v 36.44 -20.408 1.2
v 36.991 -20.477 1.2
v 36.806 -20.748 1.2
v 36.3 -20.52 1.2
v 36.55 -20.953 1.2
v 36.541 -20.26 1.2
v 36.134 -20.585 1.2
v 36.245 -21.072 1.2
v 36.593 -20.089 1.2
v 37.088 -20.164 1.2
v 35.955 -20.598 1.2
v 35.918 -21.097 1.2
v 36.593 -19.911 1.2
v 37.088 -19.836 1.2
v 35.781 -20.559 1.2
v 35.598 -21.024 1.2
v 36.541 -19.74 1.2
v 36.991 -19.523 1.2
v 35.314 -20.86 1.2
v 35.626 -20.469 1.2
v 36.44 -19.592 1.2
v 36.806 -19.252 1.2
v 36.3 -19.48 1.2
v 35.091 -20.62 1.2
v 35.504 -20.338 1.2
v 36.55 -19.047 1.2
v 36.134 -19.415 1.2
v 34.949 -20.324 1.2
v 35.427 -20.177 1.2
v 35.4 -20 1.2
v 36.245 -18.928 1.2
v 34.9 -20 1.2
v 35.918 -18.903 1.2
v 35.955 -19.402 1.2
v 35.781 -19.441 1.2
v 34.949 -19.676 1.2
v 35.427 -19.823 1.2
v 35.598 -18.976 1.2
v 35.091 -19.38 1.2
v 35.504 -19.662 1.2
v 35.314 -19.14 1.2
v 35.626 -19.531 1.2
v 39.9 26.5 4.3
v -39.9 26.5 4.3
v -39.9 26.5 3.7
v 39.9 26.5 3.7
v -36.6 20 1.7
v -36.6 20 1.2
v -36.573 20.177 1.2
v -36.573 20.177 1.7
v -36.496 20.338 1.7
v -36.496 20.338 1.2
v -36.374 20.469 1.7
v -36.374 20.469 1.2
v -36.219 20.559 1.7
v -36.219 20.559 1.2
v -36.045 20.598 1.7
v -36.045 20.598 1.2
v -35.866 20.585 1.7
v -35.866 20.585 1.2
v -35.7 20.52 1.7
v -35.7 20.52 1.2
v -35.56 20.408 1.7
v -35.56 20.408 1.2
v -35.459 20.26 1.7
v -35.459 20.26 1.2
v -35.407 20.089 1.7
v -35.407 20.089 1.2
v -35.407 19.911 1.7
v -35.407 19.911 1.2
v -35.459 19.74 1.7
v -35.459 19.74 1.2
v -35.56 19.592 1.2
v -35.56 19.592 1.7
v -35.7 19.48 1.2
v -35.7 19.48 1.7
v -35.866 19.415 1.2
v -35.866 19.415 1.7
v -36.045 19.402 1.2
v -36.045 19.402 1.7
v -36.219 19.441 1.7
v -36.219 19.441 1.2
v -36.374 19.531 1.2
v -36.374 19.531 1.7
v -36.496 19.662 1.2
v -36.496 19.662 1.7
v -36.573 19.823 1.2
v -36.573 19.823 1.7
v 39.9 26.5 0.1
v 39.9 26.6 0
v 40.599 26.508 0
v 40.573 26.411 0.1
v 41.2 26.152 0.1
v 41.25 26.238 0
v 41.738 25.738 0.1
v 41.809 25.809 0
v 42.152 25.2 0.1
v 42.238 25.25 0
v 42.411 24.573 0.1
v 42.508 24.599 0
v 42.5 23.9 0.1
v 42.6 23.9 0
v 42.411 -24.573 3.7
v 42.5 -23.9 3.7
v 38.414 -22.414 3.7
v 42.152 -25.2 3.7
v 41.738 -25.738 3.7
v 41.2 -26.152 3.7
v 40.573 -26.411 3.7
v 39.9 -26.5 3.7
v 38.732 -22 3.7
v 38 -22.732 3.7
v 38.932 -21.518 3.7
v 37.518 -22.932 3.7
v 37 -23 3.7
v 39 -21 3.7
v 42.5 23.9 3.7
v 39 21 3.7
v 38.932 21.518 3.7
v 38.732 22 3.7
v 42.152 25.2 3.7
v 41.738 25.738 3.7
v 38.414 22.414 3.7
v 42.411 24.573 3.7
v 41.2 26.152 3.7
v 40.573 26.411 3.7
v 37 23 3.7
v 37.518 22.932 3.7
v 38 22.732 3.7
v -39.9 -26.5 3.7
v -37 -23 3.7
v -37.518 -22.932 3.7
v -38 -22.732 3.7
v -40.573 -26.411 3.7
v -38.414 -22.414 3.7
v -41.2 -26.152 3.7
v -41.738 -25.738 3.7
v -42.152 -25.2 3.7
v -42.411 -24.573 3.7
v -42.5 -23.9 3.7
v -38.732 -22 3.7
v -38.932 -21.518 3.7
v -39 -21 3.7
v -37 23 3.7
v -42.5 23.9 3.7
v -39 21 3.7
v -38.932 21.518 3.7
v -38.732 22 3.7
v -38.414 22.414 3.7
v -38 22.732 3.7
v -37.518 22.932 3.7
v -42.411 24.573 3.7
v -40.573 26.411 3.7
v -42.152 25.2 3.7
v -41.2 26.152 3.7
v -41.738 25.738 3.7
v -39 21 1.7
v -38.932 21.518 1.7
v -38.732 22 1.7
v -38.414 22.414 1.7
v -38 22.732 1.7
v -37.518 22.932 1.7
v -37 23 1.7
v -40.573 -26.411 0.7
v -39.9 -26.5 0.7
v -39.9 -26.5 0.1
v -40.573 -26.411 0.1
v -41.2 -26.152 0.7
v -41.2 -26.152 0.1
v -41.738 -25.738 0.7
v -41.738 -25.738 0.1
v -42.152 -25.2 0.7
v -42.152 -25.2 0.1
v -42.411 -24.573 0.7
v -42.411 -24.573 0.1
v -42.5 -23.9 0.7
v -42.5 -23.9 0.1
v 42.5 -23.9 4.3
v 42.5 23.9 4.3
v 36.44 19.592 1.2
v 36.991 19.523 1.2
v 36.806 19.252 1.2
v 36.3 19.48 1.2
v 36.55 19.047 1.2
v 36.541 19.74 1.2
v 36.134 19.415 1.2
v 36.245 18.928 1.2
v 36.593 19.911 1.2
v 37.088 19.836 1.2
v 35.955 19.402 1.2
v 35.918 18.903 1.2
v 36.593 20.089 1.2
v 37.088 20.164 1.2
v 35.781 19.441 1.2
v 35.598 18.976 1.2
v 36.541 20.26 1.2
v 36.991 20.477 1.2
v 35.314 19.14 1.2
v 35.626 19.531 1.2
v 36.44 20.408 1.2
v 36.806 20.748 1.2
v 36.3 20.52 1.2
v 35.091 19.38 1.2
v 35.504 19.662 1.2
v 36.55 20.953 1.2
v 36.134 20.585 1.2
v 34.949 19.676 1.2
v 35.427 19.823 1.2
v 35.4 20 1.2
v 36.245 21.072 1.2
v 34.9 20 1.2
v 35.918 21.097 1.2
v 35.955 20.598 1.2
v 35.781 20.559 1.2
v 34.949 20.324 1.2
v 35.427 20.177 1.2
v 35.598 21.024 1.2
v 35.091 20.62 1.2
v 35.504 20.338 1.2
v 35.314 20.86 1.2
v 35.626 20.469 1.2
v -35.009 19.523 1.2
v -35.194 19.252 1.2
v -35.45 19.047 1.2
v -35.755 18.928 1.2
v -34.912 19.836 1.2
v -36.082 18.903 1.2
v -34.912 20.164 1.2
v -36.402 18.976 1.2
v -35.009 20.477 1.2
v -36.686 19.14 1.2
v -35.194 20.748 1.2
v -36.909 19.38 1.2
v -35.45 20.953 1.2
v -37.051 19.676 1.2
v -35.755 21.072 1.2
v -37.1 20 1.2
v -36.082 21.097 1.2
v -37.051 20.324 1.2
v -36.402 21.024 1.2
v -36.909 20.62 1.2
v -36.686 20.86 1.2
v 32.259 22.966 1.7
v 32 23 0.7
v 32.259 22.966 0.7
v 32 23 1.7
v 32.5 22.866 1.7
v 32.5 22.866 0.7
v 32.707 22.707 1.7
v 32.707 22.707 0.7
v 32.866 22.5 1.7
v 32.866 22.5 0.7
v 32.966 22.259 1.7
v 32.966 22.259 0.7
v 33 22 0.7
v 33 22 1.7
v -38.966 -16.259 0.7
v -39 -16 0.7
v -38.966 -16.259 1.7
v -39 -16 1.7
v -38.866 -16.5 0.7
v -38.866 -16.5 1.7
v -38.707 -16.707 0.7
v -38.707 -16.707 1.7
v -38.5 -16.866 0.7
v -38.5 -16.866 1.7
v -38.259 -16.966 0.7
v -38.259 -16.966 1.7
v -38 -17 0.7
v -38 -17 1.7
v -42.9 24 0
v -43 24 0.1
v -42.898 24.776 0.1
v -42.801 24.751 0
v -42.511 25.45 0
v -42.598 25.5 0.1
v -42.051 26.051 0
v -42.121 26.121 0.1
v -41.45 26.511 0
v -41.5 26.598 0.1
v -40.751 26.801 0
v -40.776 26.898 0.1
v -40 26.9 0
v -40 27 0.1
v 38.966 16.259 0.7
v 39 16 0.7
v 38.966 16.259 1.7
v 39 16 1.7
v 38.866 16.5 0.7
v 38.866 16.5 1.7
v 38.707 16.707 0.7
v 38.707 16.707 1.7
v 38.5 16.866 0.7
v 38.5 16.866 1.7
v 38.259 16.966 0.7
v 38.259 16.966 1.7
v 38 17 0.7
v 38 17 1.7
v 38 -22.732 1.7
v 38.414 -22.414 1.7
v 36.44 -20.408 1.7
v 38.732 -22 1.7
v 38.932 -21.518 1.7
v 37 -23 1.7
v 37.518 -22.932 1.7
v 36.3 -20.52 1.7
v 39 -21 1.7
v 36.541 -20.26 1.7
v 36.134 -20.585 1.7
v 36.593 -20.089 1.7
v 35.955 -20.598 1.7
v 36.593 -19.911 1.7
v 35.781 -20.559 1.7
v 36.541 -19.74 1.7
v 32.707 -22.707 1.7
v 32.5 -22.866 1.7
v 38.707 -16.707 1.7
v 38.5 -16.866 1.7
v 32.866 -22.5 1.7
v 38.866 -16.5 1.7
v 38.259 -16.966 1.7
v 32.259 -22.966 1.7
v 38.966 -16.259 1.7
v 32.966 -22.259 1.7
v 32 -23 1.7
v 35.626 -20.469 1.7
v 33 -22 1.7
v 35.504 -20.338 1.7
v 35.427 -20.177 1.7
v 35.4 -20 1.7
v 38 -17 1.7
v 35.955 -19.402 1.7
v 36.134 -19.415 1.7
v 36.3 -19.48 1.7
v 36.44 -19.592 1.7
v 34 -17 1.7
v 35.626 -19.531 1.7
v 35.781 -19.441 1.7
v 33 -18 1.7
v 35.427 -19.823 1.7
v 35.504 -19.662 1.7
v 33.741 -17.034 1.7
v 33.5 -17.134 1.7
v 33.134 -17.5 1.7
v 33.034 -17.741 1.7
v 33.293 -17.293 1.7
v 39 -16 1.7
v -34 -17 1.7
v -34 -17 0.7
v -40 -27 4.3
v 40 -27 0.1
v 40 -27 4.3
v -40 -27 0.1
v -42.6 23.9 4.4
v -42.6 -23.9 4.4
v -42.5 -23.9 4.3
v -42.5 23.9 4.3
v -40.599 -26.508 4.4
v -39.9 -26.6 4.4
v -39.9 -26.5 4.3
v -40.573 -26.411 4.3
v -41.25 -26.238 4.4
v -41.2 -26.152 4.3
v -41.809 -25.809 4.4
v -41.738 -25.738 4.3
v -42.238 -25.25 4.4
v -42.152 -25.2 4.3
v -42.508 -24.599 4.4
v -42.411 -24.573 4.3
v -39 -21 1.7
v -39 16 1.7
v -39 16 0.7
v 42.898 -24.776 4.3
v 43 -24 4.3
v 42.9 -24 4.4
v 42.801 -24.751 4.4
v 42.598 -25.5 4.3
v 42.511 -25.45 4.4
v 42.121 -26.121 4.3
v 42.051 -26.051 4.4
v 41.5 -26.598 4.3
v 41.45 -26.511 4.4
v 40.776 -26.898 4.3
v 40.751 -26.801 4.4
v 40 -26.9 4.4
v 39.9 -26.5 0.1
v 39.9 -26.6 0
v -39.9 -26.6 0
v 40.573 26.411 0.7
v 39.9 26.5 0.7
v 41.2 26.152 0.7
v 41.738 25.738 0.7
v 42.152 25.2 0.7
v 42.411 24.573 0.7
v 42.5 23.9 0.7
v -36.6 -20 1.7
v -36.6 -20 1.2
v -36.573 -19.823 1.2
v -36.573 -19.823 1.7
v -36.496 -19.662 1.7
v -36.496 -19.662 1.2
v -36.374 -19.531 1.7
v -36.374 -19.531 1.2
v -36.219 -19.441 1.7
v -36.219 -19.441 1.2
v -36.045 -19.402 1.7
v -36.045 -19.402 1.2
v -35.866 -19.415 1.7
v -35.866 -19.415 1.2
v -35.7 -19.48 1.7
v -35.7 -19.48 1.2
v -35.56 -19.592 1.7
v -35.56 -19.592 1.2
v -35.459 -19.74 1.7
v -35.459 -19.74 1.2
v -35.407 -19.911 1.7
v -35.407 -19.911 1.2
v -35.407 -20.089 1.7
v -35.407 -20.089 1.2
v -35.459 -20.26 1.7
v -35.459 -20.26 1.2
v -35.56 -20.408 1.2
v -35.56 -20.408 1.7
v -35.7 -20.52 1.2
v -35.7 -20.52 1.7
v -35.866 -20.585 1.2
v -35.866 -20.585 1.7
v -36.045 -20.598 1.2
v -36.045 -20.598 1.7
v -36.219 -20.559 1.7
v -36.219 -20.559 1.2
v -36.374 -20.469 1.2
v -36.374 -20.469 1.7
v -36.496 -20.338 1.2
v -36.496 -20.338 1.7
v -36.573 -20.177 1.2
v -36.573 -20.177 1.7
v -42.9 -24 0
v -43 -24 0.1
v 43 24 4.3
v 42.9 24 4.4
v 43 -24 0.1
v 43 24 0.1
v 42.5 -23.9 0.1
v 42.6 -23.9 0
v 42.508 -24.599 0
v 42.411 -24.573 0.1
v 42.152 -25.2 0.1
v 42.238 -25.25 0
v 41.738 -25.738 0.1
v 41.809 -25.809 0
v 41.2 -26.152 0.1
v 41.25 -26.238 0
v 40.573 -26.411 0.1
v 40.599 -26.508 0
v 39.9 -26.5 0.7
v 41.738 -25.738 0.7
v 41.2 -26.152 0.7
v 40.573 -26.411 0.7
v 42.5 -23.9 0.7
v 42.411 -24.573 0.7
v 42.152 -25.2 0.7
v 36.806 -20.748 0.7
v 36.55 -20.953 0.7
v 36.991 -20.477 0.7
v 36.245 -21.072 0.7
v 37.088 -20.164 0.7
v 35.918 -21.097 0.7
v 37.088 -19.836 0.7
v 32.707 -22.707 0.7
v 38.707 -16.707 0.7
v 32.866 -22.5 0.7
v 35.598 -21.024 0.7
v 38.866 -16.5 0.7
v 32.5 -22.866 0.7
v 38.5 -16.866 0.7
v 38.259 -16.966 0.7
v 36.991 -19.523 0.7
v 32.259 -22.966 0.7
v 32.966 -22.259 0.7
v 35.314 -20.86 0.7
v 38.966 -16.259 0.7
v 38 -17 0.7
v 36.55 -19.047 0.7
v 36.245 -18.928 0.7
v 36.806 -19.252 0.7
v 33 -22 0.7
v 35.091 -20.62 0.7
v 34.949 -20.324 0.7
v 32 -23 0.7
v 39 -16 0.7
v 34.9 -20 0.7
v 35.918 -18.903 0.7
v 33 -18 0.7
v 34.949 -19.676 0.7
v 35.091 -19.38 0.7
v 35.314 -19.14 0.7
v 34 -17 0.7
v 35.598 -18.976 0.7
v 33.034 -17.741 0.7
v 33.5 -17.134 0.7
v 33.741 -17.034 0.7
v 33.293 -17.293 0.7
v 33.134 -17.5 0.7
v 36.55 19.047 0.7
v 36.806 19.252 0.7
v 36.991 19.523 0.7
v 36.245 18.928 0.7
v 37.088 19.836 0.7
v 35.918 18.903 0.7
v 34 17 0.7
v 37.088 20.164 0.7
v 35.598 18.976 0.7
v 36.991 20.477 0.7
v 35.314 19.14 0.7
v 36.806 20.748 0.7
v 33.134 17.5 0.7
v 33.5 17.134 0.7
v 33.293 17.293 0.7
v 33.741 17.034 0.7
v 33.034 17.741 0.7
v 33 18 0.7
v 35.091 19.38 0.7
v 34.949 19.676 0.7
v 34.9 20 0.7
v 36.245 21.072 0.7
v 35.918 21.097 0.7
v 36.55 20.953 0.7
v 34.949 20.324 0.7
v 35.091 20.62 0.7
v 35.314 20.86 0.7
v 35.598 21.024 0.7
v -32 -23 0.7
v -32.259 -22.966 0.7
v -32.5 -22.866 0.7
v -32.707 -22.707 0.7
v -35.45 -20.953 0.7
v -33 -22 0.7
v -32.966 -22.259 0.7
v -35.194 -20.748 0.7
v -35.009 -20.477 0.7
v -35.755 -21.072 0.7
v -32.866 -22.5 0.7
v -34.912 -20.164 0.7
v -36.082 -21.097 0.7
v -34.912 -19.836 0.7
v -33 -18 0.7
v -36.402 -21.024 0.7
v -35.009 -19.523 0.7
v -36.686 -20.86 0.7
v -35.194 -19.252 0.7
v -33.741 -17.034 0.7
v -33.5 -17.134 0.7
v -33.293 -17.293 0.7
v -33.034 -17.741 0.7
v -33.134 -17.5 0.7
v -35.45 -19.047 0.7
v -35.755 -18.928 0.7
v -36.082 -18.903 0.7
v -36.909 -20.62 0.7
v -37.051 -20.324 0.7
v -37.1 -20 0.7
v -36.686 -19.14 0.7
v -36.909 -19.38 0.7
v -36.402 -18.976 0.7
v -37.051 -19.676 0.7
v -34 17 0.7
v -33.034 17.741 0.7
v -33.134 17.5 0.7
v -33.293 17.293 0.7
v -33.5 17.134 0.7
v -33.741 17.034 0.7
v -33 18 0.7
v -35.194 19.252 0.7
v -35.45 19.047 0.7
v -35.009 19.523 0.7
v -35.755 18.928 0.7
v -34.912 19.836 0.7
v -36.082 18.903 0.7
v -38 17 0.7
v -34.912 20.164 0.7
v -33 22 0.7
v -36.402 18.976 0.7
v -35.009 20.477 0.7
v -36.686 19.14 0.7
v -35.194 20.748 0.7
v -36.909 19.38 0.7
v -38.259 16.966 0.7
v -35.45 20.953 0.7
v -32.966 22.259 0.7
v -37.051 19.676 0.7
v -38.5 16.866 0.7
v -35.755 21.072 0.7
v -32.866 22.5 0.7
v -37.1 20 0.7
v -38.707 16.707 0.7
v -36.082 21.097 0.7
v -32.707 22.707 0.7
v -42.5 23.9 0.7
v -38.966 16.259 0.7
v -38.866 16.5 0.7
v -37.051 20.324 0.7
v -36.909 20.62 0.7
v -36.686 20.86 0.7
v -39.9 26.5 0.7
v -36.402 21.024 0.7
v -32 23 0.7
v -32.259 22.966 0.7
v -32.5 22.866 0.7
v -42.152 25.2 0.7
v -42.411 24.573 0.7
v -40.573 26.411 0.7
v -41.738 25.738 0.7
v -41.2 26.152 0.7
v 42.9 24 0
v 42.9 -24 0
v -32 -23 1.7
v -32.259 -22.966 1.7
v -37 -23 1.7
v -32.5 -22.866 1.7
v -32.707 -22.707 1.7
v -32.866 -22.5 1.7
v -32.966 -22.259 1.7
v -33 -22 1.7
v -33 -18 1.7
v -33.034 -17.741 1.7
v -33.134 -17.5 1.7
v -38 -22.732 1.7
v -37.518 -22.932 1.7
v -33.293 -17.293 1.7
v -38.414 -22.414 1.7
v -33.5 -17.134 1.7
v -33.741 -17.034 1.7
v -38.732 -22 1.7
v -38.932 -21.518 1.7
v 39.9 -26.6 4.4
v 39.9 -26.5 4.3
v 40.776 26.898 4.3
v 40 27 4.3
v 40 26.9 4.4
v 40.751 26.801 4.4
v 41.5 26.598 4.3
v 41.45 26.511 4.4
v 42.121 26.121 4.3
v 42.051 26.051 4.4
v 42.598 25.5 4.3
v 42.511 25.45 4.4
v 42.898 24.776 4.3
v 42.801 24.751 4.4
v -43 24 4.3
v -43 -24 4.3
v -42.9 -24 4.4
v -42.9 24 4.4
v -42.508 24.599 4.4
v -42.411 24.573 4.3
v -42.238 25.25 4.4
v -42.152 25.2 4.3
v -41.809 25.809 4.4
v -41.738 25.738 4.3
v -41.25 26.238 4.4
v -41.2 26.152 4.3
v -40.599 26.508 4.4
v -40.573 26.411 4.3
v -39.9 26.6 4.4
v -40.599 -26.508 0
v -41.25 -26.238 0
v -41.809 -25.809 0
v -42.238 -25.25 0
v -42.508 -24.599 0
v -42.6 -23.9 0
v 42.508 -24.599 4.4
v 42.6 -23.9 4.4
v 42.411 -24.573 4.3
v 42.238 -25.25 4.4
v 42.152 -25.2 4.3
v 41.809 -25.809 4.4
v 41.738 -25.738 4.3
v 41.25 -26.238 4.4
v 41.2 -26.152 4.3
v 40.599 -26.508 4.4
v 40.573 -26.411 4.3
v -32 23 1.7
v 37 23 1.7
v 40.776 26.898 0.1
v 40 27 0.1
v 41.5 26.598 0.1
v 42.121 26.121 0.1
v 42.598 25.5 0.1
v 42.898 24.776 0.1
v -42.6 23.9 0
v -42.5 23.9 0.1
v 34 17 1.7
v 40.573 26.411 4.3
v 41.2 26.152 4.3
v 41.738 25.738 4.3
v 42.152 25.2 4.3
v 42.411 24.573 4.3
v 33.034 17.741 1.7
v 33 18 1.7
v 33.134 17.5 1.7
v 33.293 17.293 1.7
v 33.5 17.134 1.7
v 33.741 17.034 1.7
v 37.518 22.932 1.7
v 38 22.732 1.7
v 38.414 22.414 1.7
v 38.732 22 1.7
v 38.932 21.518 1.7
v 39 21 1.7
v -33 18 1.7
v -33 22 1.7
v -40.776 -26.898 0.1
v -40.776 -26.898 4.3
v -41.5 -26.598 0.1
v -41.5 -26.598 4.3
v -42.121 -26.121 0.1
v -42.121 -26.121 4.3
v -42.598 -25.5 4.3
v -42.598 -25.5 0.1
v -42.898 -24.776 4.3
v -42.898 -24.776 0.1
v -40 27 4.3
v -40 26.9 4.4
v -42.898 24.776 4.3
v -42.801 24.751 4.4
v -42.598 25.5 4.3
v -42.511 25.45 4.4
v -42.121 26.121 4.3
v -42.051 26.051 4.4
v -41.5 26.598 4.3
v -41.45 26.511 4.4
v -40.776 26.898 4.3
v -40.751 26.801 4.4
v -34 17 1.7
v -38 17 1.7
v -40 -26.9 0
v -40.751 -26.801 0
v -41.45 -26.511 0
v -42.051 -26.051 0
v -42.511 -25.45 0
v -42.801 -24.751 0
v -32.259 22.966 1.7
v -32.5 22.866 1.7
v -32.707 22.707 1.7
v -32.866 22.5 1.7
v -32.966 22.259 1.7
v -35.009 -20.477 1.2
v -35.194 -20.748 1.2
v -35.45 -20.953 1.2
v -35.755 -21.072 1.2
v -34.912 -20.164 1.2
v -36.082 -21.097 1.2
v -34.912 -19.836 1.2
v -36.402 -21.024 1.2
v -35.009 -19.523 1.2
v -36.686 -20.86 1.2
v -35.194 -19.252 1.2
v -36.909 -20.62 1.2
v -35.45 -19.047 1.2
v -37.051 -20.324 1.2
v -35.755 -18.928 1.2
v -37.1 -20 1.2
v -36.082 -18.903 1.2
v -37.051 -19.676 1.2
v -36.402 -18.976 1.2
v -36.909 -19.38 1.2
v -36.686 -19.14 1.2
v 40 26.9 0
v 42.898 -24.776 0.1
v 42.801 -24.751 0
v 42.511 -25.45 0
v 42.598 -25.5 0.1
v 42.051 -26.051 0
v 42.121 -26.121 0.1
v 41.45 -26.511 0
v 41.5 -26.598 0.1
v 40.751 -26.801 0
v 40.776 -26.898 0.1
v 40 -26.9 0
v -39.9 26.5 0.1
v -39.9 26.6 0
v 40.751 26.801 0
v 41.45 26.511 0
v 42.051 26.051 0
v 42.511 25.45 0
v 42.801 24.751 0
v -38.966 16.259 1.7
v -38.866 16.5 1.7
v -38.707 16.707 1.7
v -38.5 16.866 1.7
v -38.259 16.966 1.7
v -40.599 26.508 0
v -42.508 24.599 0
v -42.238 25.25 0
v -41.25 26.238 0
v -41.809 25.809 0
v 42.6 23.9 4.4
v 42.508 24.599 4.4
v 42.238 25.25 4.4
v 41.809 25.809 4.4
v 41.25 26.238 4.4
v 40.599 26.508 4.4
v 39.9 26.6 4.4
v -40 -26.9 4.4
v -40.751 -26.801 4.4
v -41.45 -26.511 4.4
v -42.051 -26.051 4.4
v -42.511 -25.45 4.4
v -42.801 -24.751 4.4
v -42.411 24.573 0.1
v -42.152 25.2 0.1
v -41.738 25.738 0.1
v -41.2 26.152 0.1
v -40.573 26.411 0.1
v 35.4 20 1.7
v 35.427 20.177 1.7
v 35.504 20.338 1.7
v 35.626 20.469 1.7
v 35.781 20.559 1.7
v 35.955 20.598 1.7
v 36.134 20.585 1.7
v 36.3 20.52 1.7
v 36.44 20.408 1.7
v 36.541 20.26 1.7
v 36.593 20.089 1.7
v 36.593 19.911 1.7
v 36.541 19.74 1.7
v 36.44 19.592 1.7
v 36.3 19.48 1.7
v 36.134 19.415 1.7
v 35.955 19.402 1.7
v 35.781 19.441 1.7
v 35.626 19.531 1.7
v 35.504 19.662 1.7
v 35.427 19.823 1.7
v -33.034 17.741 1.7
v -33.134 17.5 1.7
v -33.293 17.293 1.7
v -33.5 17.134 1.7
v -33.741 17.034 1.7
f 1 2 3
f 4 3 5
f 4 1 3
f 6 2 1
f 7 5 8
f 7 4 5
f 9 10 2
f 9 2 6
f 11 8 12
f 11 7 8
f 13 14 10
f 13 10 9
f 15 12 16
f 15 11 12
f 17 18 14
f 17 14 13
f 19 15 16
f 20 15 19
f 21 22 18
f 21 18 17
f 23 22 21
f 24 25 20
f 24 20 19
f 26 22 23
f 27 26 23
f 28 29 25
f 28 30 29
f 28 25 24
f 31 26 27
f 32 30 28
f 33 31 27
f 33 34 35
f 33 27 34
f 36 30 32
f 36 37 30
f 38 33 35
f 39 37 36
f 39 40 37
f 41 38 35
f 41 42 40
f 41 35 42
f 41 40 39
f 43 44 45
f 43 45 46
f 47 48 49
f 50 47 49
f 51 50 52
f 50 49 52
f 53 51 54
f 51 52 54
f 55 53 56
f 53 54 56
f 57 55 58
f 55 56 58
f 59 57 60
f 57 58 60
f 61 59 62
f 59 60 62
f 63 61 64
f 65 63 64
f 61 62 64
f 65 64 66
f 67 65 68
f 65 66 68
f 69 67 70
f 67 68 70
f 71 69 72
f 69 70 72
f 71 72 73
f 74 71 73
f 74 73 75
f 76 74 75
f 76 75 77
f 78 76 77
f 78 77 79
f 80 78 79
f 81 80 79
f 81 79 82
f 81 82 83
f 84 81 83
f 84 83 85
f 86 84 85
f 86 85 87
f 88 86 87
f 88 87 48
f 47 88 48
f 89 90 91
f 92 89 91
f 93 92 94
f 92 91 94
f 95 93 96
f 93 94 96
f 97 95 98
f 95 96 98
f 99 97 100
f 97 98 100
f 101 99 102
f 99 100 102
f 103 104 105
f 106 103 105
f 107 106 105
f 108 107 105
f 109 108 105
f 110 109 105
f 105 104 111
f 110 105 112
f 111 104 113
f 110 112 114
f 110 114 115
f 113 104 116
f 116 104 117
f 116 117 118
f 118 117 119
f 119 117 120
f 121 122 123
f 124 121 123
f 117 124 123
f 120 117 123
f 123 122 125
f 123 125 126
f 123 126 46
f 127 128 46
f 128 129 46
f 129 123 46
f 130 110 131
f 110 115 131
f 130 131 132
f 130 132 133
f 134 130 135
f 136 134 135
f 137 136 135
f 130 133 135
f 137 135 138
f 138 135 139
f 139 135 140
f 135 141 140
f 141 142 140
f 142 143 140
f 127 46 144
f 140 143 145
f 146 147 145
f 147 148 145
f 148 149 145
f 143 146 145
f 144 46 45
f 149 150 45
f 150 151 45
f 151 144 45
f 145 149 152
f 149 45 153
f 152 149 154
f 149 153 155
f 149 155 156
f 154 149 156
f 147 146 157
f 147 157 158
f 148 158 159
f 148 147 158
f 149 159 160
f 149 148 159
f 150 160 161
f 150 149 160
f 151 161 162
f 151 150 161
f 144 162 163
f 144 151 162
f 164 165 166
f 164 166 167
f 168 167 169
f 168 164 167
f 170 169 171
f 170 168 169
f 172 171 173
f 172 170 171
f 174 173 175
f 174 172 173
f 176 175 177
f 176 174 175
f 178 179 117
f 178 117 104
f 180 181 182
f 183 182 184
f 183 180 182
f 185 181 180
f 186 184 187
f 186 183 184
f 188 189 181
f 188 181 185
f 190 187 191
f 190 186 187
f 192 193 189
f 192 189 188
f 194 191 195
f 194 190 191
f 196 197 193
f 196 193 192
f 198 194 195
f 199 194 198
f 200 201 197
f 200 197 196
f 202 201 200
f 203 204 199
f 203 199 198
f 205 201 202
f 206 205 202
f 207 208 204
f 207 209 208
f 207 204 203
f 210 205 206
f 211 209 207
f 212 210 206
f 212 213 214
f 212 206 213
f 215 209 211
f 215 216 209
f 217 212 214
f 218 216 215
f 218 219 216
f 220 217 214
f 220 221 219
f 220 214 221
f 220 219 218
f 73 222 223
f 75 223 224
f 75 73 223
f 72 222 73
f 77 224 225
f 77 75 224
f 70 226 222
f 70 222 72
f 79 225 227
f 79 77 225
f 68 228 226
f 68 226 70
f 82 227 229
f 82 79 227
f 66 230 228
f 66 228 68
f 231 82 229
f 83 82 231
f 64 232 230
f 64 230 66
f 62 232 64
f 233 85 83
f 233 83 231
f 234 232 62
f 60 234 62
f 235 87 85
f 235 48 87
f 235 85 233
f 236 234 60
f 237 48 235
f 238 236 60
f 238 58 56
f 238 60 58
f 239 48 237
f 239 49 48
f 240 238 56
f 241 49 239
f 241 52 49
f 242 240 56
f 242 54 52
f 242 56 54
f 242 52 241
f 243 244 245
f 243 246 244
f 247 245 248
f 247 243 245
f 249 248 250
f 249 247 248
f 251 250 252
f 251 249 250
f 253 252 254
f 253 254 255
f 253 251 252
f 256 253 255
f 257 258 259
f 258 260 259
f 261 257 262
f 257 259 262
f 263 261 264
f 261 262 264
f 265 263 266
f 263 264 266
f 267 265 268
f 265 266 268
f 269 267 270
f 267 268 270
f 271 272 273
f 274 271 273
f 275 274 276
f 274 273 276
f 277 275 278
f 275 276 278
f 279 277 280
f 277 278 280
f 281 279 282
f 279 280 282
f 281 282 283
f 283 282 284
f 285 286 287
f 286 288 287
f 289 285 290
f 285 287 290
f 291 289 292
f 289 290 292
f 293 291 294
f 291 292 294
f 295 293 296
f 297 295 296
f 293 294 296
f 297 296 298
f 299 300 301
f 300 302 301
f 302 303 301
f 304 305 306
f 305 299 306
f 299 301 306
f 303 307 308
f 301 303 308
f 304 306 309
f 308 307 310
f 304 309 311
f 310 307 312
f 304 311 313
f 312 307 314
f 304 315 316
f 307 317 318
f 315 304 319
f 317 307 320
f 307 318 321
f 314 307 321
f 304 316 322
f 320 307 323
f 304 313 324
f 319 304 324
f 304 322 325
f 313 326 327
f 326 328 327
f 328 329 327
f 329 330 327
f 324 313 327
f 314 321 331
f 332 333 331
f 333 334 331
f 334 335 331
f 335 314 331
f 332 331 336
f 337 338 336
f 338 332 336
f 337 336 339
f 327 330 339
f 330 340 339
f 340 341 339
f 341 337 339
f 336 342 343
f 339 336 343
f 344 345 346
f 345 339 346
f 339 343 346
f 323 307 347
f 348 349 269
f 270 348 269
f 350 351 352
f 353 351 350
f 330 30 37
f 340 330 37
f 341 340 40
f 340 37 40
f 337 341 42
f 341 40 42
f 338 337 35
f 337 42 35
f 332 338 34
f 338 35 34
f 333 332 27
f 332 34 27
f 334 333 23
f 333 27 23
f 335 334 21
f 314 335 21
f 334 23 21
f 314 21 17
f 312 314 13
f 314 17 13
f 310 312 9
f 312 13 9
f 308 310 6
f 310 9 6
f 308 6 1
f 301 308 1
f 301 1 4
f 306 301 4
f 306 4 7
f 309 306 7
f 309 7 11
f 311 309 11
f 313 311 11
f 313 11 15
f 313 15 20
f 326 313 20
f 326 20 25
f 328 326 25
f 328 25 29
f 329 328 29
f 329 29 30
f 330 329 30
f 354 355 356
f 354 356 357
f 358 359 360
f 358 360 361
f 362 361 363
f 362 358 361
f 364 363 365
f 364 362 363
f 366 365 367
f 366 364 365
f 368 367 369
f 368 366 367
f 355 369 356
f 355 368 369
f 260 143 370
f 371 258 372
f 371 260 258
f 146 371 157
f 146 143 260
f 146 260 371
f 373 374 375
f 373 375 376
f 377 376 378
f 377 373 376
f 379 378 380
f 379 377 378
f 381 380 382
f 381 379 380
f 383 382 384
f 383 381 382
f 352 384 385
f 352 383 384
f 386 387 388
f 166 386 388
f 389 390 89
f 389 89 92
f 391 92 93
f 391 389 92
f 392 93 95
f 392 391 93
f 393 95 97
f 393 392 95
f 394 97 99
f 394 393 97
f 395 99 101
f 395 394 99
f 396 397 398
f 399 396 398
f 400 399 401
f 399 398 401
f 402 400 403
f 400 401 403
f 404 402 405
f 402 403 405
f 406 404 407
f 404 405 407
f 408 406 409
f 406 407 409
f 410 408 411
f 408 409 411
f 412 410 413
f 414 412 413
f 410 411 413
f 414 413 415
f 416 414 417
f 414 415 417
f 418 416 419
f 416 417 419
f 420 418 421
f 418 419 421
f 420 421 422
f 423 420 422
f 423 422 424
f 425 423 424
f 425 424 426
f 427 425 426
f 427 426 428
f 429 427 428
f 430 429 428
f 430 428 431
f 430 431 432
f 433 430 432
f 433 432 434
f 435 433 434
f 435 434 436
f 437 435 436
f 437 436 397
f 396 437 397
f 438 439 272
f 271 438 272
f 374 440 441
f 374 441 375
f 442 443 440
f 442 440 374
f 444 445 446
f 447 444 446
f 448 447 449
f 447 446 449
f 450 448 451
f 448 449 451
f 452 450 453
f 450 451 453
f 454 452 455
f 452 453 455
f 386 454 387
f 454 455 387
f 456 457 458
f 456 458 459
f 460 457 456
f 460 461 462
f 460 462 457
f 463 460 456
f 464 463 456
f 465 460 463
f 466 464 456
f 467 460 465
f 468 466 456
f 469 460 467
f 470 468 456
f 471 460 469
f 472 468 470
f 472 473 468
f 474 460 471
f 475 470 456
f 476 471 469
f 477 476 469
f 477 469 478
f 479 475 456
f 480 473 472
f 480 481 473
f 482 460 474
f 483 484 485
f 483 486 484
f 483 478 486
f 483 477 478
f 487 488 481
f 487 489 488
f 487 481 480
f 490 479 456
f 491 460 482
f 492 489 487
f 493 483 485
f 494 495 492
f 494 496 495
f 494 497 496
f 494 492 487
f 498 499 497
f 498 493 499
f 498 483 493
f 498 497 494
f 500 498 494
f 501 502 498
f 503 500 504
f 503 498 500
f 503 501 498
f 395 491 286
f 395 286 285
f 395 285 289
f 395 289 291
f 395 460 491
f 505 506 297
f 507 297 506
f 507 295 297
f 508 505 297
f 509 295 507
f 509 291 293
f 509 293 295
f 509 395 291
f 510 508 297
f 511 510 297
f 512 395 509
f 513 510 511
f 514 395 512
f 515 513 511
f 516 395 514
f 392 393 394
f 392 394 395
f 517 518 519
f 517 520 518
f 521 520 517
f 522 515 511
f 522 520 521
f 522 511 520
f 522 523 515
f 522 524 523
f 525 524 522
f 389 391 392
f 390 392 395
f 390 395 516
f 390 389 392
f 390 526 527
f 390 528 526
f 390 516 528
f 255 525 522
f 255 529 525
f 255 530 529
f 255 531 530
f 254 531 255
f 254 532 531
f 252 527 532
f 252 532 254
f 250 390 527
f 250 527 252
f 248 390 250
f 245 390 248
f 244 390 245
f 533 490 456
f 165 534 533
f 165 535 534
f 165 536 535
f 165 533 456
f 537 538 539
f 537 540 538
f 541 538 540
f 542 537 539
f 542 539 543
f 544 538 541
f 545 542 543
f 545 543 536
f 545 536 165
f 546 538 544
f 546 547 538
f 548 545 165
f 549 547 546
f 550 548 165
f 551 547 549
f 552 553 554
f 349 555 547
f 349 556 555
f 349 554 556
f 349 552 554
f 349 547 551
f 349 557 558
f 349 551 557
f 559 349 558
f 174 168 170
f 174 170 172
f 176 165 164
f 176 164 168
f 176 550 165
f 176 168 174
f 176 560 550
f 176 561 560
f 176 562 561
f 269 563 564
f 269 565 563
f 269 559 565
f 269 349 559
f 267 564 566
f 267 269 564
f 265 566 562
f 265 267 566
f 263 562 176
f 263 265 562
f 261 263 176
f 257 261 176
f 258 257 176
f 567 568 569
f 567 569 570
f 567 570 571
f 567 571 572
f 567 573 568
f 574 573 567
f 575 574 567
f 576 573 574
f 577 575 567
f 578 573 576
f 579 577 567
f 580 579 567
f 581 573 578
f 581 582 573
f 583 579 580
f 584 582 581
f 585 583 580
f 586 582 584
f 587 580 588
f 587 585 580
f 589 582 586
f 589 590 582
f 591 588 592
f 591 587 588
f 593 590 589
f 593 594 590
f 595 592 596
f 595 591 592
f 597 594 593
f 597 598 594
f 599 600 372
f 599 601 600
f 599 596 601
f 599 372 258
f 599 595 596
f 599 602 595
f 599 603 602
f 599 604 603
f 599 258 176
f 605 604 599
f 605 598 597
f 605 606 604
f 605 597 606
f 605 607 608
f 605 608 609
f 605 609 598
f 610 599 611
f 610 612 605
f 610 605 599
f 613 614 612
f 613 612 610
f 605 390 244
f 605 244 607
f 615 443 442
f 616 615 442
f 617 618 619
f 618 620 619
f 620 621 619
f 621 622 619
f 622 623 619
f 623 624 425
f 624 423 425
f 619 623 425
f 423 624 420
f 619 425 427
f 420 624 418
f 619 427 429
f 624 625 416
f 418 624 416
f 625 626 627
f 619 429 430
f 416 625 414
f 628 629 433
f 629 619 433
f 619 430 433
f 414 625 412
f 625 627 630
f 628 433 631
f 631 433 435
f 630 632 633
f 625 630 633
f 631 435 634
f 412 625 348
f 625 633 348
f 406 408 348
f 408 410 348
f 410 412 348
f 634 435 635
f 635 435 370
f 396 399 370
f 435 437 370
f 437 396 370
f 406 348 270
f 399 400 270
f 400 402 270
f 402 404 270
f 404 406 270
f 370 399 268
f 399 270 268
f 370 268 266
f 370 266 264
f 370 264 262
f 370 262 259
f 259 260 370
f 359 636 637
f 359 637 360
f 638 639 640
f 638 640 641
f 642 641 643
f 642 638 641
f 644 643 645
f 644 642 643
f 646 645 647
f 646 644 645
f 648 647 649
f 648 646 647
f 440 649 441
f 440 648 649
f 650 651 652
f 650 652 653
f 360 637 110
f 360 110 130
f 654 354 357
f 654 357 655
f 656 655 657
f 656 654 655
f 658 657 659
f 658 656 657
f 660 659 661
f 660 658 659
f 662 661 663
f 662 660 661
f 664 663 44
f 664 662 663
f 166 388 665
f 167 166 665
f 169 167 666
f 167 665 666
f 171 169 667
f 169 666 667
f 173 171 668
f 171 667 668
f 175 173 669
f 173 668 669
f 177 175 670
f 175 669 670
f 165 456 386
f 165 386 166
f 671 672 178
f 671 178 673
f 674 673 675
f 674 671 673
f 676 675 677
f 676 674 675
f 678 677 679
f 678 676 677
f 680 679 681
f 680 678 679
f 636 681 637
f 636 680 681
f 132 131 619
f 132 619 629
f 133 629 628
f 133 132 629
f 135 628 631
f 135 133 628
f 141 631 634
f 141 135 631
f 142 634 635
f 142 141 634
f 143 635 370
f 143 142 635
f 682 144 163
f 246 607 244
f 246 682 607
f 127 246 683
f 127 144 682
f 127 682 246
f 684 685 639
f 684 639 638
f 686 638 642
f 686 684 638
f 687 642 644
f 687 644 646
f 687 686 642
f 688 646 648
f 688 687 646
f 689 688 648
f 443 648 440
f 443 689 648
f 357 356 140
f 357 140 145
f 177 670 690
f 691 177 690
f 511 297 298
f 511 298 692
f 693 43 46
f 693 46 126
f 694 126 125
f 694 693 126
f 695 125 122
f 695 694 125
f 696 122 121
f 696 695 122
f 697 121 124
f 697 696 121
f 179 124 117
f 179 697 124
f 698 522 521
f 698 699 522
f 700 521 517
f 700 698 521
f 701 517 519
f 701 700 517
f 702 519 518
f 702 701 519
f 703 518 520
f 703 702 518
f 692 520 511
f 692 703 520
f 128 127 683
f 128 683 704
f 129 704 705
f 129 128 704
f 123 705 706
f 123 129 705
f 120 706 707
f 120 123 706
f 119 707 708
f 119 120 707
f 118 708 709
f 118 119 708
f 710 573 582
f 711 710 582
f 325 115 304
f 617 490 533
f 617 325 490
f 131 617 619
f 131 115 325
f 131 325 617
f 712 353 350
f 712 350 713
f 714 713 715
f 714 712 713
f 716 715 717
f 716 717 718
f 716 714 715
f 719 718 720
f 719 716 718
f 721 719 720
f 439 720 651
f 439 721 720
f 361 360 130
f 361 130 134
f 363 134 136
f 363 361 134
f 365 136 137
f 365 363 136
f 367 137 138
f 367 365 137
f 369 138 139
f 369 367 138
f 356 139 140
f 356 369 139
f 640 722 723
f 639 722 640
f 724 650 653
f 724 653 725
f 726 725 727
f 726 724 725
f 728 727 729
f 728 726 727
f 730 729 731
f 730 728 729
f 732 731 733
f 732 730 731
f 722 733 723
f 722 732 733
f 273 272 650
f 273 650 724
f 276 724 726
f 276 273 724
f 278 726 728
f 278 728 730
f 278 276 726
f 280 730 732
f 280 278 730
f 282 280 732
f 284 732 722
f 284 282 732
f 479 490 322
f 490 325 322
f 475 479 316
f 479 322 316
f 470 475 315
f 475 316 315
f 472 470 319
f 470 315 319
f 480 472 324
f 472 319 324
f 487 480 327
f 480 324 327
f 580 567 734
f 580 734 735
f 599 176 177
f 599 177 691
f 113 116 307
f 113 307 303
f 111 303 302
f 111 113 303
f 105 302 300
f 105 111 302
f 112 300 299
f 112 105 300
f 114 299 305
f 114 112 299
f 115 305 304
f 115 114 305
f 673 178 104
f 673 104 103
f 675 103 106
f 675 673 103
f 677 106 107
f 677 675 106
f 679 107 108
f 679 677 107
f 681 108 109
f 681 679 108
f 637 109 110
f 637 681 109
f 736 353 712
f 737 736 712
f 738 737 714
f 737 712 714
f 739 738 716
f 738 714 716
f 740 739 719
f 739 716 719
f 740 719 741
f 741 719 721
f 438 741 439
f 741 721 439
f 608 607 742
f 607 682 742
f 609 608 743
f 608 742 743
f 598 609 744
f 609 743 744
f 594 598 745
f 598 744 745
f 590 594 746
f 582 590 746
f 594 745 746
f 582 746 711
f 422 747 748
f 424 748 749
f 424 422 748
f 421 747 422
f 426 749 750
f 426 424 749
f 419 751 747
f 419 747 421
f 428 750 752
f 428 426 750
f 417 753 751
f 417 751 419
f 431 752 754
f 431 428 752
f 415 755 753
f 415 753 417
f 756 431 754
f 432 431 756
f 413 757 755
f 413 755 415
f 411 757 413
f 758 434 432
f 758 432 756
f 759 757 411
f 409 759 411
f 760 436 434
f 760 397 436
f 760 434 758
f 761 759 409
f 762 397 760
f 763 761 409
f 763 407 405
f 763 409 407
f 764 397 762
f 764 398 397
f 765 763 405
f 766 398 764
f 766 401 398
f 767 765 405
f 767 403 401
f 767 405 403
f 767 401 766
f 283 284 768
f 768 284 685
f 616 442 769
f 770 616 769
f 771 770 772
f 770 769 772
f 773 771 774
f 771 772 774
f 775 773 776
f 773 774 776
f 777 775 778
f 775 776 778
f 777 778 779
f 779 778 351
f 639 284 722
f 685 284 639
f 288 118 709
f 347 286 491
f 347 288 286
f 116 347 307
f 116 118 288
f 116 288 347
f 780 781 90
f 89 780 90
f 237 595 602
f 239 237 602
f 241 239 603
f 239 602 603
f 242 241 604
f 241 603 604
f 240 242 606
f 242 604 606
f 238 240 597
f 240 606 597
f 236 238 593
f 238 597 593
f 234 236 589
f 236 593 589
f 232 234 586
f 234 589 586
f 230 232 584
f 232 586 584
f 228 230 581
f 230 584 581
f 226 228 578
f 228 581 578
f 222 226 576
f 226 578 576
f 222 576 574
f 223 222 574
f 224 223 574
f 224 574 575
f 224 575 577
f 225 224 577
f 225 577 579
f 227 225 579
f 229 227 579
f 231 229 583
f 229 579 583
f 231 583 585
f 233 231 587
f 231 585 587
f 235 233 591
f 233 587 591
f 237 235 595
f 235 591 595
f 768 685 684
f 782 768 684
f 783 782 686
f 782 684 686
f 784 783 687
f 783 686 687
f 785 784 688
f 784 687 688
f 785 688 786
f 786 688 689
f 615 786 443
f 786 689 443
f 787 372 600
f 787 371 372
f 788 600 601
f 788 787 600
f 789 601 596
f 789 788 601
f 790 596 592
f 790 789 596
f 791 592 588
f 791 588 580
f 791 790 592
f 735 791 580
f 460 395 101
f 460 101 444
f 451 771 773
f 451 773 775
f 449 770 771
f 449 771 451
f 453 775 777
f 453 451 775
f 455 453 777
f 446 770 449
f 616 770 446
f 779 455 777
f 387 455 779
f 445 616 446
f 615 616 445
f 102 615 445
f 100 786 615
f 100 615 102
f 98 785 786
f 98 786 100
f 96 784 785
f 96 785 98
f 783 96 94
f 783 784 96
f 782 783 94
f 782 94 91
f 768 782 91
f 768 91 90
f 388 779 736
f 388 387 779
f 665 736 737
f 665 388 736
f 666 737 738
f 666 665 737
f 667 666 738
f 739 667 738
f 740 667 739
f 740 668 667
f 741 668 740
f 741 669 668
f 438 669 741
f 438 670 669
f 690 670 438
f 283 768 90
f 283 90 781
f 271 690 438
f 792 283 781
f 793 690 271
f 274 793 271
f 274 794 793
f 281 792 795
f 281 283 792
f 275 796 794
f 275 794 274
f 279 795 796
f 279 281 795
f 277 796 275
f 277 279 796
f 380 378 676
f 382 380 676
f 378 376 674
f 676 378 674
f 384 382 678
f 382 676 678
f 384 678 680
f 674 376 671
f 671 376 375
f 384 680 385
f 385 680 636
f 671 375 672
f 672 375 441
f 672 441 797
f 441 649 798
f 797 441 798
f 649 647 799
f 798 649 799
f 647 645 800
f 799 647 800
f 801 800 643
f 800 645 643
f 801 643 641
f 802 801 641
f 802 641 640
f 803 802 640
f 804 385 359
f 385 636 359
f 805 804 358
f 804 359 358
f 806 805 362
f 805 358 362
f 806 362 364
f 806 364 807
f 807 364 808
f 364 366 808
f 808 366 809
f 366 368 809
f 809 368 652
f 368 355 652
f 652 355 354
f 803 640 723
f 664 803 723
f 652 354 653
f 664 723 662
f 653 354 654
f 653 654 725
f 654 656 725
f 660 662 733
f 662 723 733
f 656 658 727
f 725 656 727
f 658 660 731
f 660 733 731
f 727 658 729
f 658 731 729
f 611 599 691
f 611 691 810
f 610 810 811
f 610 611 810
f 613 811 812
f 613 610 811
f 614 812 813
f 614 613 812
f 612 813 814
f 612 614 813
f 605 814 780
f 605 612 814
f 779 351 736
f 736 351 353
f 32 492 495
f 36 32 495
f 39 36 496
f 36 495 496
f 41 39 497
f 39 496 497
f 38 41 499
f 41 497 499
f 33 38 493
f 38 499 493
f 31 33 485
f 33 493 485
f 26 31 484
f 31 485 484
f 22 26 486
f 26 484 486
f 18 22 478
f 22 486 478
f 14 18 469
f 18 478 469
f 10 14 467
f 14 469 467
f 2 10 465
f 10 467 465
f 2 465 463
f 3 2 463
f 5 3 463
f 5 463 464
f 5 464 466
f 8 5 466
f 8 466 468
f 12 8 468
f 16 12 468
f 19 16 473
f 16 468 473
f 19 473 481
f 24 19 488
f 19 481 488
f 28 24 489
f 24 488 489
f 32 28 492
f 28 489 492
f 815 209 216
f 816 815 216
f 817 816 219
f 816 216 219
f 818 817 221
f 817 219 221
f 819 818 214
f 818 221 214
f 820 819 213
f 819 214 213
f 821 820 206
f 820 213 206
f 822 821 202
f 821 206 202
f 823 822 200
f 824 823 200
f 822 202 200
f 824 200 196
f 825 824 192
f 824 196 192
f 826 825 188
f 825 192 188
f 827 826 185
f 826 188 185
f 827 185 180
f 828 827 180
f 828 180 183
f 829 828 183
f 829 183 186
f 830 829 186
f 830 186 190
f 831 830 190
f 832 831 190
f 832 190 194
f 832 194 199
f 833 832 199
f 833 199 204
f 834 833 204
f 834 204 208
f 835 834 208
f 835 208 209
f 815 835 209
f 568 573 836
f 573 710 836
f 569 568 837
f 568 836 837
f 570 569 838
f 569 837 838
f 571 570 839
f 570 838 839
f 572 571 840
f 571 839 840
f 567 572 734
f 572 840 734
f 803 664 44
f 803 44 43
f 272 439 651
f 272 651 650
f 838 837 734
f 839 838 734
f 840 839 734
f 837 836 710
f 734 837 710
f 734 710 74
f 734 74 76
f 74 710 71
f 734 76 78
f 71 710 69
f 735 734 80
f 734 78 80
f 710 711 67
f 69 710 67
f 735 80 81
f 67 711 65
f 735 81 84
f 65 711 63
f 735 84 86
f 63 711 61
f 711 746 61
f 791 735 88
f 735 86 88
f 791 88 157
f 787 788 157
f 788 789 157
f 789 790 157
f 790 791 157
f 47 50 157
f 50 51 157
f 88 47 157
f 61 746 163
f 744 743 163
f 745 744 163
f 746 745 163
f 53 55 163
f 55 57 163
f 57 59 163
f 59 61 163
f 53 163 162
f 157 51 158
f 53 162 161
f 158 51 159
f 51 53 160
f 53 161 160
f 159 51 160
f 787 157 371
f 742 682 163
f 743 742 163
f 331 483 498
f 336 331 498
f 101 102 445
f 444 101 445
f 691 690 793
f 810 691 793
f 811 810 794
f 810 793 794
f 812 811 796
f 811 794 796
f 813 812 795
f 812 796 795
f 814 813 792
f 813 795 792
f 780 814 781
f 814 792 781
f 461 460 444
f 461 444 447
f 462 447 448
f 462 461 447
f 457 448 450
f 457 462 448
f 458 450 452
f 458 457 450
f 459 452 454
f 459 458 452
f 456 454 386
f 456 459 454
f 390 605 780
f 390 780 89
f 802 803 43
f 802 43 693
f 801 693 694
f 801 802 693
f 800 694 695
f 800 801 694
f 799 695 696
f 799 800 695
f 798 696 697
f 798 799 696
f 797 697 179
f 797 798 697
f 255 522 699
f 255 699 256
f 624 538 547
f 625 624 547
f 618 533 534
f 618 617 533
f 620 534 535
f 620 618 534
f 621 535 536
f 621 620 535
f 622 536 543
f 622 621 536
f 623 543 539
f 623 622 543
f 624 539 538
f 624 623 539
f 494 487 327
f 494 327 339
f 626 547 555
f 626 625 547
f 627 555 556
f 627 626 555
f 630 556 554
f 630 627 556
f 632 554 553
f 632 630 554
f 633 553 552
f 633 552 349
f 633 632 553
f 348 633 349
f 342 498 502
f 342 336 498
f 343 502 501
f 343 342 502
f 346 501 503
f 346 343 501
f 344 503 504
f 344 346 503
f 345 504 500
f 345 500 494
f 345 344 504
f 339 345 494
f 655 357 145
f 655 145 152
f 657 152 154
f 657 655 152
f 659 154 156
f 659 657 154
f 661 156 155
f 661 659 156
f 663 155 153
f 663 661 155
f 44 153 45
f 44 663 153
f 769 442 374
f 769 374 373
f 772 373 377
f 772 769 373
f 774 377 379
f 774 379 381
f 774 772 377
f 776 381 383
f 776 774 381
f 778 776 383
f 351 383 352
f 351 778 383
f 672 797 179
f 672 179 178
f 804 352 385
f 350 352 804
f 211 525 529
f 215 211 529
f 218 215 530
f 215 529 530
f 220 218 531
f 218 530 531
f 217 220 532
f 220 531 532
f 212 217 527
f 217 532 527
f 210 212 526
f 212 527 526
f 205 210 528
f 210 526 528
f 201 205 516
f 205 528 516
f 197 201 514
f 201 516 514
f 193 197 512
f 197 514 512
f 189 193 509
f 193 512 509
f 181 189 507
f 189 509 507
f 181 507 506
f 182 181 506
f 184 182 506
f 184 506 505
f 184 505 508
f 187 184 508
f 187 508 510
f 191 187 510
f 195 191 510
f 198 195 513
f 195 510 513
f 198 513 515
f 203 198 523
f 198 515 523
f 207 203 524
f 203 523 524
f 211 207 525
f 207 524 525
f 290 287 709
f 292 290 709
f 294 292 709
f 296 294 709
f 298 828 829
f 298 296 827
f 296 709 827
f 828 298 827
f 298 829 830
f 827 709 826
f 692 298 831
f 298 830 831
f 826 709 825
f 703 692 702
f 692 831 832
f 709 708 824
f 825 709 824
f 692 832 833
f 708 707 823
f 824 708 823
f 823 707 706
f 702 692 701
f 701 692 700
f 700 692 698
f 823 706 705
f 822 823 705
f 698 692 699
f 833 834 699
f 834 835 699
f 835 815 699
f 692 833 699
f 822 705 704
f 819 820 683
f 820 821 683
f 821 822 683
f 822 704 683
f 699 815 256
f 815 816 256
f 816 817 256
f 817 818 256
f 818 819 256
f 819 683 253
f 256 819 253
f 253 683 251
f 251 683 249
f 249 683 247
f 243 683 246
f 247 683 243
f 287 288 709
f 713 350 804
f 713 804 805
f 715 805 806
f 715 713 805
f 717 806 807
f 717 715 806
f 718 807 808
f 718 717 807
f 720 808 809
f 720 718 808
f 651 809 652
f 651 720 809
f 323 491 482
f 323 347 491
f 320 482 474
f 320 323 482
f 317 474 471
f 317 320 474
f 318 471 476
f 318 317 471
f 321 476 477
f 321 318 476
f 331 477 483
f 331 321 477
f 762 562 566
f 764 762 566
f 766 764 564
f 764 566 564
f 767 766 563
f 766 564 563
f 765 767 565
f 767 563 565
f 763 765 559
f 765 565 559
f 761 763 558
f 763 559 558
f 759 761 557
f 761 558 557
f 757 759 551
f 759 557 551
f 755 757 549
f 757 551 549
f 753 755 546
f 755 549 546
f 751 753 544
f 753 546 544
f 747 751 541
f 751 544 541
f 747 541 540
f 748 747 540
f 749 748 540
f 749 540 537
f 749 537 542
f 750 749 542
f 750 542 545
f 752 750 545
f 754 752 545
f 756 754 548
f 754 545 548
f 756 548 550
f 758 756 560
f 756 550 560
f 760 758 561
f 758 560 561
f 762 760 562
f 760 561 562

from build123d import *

# Parameters (mm, degrees)
EXTRUDE_1_DEPTH     = 4.4
CUT_EXTRUDE_1_DEPTH = 4.4
EXTRUDE_START       = -0.7
EXTRUDE_2_DEPTH     = 3
CUT_EXTRUDE_2_DEPTH = 3
SKETCH_7_W          = 6
SKETCH_7_H          = 6
EXTRUDE_4_DEPTH     = 1
FILLET_1_R          = 1
SKETCH_8_R          = 0.6
CUT_EXTRUDE_3_DEPTH = 1
CHAMFER_1_SIZE      = 0.1
SKETCH_9_R          = 1.1
CUT_EXTRUDE_4_DEPTH = 0.5


with BuildPart() as part:
    # Эскиз1 → Бобышка-Вытянуть1 (new body)
    with BuildSketch(Plane.XY):
        with BuildLine():
            Line((-40, 27), (40, 27))
            ThreePointArc((40, 27), (42.121320344, 26.121320344), (43, 24))
            Line((43, 24), (43, -24))
            ThreePointArc((43, -24), (42.121320344, -26.121320344), (40, -27))
            Line((40, -27), (-40, -27))
            ThreePointArc((-40, -27), (-42.121320344, -26.121320344), (-43, -24))
            Line((-43, -24), (-43, 24))
            ThreePointArc((-43, 24), (-42.121320344, 26.121320344), (-40, 27))
        make_face()
    extrude(amount=EXTRUDE_1_DEPTH)

    # Эскиз2 → Вырез-Вытянуть1 (cut)
    with BuildSketch(Plane.XY.offset(4.4)):
        with BuildLine():
            Line((-39.9, 26.5), (39.9, 26.5))
            ThreePointArc((39.9, 26.5), (41.738477631, 25.738477631), (42.5, 23.9))
            Line((42.5, 23.9), (42.5, -23.9))
            ThreePointArc((42.5, -23.9), (41.738477631, -25.738477631), (39.9, -26.5))
            Line((39.9, -26.5), (-39.9, -26.5))
            ThreePointArc((-39.9, -26.5), (-41.738477631, -25.738477631), (-42.5, -23.9))
            Line((-42.5, -23.9), (-42.5, 23.9))
            ThreePointArc((-42.5, 23.9), (-41.738477631, 25.738477631), (-39.9, 26.5))
        make_face()
    extrude(amount=-CUT_EXTRUDE_1_DEPTH, mode=Mode.SUBTRACT)

    # Эскиз4 → Бобышка-Вытянуть2 (add)
    with BuildSketch(Plane.XY.offset(4.4).offset(EXTRUDE_START)):
        with BuildLine():
            Line((-39.9, 26.5), (39.9, 26.5))
            ThreePointArc((39.9, 26.5), (41.738477631, 25.738477631), (42.5, 23.9))
            Line((42.5, 23.9), (42.5, -23.9))
            ThreePointArc((42.5, -23.9), (41.738477631, -25.738477631), (39.9, -26.5))
            Line((39.9, -26.5), (-39.9, -26.5))
            ThreePointArc((-39.9, -26.5), (-41.738477631, -25.738477631), (-42.5, -23.9))
            Line((-42.5, -23.9), (-42.5, 23.9))
            ThreePointArc((-42.5, 23.9), (-41.738477631, 25.738477631), (-39.9, 26.5))
        make_face()
    extrude(amount=-EXTRUDE_2_DEPTH)

    # Эскиз5 → Вырез-Вытянуть2 (cut)
    with BuildSketch(Plane.XY.offset(3.7)):
        with BuildLine():
            Line((-37, 23), (37, 23))
            ThreePointArc((37, 23), (38.414213562, 22.414213562), (39, 21))
            Line((39, 21), (39, -21))
            ThreePointArc((39, -21), (38.414213562, -22.414213562), (37, -23))
            Line((37, -23), (-37, -23))
            ThreePointArc((-37, -23), (-38.414213562, -22.414213562), (-39, -21))
            Line((-39, -21), (-39, 21))
            ThreePointArc((-39, 21), (-38.414213562, 22.414213562), (-37, 23))
        make_face()
    extrude(amount=-CUT_EXTRUDE_2_DEPTH, mode=Mode.SUBTRACT)

    # Эскиз7 → Бобышка-Вытянуть4 (add)
    with BuildSketch(Plane(origin=(0, 0, 0.7), x_dir=(-1, 0, 0), z_dir=(0, 0, -1))):
        with Locations((-36, 20)):
            Rectangle(SKETCH_7_W, SKETCH_7_H)
        with Locations((36, 20)):
            Rectangle(SKETCH_7_W, SKETCH_7_H)
        with Locations((36, -20)):
            Rectangle(SKETCH_7_W, SKETCH_7_H)
        with Locations((-36, -20)):
            Rectangle(SKETCH_7_W, SKETCH_7_H)
    extrude(amount=-EXTRUDE_4_DEPTH)

    # Скругление1
    fillet_1_edges = [part.edges().sort_by_distance(p)[0] for p in [
        (39, 17, 1.2),
        (33, 23, 1.2),
        (33, 17, 1.2),
        (-39, -17, 1.2),
        (-33, -23, 1.2),
        (-33, -17, 1.2),
        (-33, 23, 1.2),
        (-39, 17, 1.2),
        (-33, 17, 1.2),
        (33, -23, 1.2),
        (39, -17, 1.2),
        (33, -17, 1.2),
    ]]
    fillet(fillet_1_edges, radius=FILLET_1_R)

    # Эскиз8 → Вырез-Вытянуть3 (cut)
    with BuildSketch(Plane(origin=(0, 0, 0.7), x_dir=(-1, 0, 0), z_dir=(0, 0, -1))):
        with Locations((-36, 20)):
            Circle(SKETCH_8_R)
        with Locations((36, 20)):
            Circle(SKETCH_8_R)
        with Locations((36, -20)):
            Circle(SKETCH_8_R)
        with Locations((-36, -20)):
            Circle(SKETCH_8_R)
    extrude(amount=-CUT_EXTRUDE_3_DEPTH, mode=Mode.SUBTRACT)

    # Фаска1
    chamfer_1_edges = [part.edges().sort_by_distance(p)[0] for p in [
        (43, 0, 0),
        (42.121320344, -26.121320344, 0),
        (0, -27, 0),
        (-42.121320344, -26.121320344, 0),
        (42.121320344, -26.121320344, 4.4),
        (43, 0, 4.4),
        (42.121320344, 26.121320344, 4.4),
        (0, 27, 4.4),
        (-42.121320344, 26.121320344, 4.4),
        (-43, 0, 4.4),
        (-41.738477631, 25.738477631, 0),
        (0, 26.5, 0),
        (41.738477631, 25.738477631, 0),
        (42.5, 0, 0),
        (41.738477631, -25.738477631, 0),
        (0, -26.5, 0),
        (-41.738477631, -25.738477631, 0),
        (-42.5, 0, 0),
        (-41.738477631, 25.738477631, 4.4),
        (-42.5, 0, 4.4),
        (-41.738477631, -25.738477631, 4.4),
        (0, -26.5, 4.4),
        (41.738477631, -25.738477631, 4.4),
        (42.5, 0, 4.4),
        (41.738477631, 25.738477631, 4.4),
        (0, 26.5, 4.4),
        (-42.121320344, -26.121320344, 4.4),
        (-43, 0, 0),
        (0, -27, 4.4),
        (-42.121320344, 26.121320344, 0),
        (0, 27, 0),
        (42.121320344, 26.121320344, 0),
    ]]
    chamfer(chamfer_1_edges, length=CHAMFER_1_SIZE)

    # Эскиз9 → Вырез-Вытянуть4 (cut)
    with BuildSketch(Plane(origin=(0, 0, 0.7), x_dir=(-1, 0, 0), z_dir=(0, 0, -1))):
        with Locations((36, 20)):
            Circle(SKETCH_9_R)
        with Locations((36, -20)):
            Circle(SKETCH_9_R)
        with Locations((-36, -20)):
            Circle(SKETCH_9_R)
        with Locations((-36, 20)):
            Circle(SKETCH_9_R)
    extrude(amount=-CUT_EXTRUDE_4_DEPTH, mode=Mode.SUBTRACT)


solid = part.part
